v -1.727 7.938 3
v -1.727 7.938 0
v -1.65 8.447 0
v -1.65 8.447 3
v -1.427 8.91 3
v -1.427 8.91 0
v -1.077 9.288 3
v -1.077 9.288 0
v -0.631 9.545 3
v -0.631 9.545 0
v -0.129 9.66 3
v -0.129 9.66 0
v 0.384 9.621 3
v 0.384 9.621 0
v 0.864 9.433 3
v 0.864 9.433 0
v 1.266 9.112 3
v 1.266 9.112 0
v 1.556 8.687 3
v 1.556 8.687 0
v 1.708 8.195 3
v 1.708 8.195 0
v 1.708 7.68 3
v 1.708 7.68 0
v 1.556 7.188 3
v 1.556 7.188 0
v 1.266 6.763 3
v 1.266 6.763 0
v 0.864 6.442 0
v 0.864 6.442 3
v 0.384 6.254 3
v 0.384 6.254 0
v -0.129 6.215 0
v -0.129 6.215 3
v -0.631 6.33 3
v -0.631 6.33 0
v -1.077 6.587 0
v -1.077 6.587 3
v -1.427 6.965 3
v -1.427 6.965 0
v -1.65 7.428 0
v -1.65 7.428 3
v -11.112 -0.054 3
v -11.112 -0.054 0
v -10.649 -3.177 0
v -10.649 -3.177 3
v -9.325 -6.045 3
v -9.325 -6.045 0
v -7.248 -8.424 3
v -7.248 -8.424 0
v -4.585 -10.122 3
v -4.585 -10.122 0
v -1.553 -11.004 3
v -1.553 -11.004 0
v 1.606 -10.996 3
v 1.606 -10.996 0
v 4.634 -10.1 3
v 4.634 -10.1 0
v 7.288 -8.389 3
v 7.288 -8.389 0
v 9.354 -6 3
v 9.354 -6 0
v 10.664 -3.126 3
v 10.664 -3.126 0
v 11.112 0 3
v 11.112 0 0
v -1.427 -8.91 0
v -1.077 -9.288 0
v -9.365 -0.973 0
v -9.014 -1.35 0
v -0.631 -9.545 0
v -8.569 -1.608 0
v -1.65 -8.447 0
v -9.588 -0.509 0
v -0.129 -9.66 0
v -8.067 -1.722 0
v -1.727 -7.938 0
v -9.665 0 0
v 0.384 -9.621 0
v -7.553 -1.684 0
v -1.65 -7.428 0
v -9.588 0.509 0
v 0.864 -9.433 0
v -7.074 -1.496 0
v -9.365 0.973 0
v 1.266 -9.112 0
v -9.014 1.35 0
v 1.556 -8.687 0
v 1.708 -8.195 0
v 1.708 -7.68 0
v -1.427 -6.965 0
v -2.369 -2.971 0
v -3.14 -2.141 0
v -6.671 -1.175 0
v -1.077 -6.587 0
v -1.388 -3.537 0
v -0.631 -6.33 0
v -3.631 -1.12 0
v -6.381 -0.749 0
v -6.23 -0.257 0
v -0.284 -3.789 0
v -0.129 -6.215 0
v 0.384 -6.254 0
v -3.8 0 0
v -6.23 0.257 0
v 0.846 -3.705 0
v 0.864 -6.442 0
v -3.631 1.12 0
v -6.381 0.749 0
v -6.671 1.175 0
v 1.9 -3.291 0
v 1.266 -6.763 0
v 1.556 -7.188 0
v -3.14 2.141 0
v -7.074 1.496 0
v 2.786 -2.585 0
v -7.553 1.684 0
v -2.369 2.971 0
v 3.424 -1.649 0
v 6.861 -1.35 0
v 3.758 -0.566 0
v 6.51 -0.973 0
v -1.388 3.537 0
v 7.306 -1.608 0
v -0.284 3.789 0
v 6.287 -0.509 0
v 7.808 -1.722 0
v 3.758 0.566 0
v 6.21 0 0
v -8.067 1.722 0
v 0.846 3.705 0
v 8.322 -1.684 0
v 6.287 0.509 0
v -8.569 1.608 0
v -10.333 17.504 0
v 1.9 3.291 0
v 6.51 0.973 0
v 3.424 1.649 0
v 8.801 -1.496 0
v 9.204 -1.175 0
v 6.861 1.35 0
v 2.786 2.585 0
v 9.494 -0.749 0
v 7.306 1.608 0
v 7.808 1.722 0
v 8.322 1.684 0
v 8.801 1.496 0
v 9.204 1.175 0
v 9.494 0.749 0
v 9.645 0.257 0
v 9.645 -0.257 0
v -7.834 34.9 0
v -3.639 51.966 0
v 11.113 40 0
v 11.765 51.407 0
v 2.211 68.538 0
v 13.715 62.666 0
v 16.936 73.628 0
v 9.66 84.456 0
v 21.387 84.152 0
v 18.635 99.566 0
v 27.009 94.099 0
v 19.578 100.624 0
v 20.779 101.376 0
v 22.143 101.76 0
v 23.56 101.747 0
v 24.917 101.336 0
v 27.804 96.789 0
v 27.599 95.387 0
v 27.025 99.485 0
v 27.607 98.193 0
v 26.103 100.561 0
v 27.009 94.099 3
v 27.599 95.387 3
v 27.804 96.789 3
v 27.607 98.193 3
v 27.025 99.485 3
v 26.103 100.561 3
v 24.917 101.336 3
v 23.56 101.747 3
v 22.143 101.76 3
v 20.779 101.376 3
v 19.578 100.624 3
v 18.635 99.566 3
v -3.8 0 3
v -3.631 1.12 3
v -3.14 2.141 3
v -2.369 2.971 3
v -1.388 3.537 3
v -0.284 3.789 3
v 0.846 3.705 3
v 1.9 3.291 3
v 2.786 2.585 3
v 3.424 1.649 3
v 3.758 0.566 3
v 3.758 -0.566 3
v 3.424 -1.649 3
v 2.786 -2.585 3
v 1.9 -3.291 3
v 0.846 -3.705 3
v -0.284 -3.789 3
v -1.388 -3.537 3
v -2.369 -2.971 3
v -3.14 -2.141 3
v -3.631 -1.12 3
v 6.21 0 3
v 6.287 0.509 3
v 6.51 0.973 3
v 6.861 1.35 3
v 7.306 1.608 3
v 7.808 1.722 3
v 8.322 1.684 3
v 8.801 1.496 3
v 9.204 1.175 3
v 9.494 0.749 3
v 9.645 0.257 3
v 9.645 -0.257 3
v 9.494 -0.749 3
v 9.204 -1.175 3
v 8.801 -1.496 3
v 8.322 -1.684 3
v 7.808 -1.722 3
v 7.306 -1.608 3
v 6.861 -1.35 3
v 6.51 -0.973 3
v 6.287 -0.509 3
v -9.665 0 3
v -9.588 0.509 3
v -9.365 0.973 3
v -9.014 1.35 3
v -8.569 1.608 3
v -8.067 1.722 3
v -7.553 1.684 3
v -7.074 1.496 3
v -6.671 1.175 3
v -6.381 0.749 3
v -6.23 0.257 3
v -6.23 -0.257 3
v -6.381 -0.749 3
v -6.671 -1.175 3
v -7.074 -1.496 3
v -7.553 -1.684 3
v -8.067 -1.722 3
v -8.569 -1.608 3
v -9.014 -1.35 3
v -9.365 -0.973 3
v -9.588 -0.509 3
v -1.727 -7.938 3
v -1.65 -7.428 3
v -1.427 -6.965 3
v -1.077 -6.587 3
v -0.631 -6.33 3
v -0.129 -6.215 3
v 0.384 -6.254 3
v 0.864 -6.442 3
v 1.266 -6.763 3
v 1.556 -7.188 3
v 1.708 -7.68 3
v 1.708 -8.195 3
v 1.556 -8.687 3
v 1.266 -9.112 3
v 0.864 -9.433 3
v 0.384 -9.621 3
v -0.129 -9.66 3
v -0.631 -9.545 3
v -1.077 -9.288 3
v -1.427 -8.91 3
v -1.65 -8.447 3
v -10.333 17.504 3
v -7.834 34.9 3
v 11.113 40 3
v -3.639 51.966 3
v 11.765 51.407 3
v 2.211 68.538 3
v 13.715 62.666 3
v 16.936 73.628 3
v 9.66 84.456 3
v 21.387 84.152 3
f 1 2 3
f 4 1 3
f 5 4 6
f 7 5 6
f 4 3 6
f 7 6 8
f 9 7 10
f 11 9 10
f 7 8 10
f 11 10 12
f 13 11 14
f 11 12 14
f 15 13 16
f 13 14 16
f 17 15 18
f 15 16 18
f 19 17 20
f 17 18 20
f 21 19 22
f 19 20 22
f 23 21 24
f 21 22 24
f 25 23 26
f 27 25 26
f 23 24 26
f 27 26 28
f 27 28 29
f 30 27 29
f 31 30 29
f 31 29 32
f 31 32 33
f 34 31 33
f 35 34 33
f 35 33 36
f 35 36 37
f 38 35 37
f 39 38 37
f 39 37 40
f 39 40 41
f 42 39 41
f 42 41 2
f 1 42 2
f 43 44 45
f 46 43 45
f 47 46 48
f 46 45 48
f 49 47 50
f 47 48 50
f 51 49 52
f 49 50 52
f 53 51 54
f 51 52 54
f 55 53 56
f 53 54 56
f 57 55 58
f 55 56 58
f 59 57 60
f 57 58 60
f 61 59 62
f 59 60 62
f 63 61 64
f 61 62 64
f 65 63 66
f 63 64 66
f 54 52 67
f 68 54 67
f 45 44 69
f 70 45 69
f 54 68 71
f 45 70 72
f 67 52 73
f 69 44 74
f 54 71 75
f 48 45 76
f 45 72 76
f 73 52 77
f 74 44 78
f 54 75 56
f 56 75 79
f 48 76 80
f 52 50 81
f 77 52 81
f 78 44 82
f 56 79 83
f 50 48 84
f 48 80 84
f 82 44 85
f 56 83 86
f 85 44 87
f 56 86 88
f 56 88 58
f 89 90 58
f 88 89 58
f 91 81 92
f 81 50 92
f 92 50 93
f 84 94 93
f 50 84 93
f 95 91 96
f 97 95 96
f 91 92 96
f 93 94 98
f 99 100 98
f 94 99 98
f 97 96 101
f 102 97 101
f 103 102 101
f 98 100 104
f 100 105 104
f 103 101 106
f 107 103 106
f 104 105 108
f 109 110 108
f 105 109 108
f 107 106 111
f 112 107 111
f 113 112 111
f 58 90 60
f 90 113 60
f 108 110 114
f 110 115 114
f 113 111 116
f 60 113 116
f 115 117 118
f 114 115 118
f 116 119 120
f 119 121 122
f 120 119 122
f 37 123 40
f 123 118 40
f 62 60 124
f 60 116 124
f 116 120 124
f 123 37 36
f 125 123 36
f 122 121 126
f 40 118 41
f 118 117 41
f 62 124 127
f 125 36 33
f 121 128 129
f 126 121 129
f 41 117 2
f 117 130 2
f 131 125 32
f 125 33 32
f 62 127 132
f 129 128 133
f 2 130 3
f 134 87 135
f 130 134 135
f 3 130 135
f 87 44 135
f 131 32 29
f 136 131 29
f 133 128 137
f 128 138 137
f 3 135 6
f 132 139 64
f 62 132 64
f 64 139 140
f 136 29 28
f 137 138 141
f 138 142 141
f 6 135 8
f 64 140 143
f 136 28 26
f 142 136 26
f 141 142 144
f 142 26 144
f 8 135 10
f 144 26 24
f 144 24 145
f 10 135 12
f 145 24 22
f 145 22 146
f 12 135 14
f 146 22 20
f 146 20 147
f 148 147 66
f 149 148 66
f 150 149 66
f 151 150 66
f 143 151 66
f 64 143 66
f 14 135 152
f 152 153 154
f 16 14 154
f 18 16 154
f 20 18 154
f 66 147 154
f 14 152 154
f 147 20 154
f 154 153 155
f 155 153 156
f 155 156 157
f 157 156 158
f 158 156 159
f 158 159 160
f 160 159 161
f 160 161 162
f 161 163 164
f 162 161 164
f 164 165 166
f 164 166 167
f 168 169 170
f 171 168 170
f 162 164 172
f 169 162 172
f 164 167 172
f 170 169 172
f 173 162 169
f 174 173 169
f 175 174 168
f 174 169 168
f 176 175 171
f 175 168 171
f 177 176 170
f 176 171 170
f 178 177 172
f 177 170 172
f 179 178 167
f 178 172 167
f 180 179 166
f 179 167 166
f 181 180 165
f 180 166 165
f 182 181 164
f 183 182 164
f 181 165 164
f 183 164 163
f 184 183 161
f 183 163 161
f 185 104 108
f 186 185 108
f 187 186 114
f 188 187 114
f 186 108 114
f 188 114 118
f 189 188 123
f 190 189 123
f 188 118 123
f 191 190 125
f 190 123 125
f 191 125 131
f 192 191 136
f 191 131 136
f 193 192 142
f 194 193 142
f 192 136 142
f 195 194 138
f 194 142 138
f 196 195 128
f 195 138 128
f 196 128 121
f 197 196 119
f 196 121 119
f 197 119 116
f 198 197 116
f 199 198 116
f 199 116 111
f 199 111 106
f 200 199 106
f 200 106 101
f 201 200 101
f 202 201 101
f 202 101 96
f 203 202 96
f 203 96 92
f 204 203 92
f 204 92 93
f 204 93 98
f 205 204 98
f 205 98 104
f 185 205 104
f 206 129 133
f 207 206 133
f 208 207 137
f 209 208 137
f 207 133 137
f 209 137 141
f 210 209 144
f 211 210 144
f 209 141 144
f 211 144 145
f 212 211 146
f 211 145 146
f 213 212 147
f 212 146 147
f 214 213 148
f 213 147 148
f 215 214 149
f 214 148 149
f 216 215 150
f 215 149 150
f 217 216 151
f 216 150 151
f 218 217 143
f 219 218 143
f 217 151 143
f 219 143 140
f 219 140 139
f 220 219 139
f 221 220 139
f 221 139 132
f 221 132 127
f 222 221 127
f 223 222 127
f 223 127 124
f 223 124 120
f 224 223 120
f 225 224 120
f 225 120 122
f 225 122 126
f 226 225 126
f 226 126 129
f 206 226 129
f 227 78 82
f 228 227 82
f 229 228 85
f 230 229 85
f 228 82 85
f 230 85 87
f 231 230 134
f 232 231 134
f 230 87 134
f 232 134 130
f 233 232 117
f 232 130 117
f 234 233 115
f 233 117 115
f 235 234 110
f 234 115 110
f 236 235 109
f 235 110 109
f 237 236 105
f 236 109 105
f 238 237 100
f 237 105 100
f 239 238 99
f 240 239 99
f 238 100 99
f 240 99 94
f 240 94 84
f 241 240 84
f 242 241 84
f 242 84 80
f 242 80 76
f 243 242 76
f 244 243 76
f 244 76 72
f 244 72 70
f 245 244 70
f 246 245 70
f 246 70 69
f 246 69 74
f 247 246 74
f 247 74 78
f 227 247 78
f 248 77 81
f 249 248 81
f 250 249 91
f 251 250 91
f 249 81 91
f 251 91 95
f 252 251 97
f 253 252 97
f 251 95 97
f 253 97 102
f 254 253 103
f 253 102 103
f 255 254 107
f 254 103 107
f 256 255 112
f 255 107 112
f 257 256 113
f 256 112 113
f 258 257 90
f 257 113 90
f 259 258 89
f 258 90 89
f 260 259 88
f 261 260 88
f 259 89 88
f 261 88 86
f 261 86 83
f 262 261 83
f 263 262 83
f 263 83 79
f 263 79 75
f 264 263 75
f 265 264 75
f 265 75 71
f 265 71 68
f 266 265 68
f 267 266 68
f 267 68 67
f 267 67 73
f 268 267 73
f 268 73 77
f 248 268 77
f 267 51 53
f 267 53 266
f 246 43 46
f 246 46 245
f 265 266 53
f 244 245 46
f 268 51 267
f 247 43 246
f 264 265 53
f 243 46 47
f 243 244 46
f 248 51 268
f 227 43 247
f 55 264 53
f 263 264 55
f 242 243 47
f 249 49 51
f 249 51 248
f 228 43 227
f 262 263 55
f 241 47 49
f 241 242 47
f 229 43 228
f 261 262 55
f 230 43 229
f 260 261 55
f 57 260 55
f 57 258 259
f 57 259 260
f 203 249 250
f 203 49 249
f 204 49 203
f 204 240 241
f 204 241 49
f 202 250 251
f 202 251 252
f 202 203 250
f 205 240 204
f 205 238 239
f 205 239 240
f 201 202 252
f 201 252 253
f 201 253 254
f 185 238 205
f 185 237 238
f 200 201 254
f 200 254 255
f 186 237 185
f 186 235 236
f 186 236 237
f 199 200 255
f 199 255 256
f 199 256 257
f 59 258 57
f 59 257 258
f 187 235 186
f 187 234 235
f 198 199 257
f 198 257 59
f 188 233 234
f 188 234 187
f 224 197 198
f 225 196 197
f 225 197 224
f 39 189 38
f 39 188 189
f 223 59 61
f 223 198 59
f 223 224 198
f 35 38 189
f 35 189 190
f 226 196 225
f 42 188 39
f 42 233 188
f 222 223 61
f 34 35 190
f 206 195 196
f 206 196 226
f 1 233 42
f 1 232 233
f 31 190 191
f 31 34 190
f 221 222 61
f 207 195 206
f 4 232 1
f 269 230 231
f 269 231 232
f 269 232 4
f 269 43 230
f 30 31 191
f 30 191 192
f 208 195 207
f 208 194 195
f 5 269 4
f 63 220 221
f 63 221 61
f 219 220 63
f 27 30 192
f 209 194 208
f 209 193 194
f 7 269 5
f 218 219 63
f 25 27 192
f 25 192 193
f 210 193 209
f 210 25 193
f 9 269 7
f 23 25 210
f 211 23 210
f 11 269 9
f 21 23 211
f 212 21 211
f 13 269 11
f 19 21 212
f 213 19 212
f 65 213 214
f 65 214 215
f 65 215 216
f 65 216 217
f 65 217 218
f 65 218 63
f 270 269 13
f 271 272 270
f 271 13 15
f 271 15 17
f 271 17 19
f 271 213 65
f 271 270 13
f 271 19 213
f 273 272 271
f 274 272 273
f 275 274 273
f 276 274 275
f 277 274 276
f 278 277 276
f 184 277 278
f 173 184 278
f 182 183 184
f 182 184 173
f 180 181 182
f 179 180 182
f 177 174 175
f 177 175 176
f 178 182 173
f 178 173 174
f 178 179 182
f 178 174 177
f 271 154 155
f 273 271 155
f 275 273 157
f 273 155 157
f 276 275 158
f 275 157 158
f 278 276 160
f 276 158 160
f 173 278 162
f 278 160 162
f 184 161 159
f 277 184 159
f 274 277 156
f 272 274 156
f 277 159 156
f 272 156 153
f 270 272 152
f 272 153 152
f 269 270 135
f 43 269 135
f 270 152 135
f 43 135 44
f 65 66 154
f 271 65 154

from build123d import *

# Parameters (mm, degrees)
BOSS_EXTRU_3_DEPTH   = 3
D_GAGEMENT_51_D      = 3.4544
D_GAGEMENT_M71_D     = 7.6
D_GAGEMENT_M71_DEPTH = 7.01
D_GAGEMENT_M71_TIP   = 2.283270352


with BuildPart() as part:
    # Esquisse1 → Boss.-Extru.3 (new body)
    with BuildSketch(Plane.XY):
        with BuildLine():
            Line((11.1125, 0), (11.1125, 40))
            ThreePointArc((11.1125, 40), (15.168988239, 68.192952149), (27.009351017, 94.098616722))
            ThreePointArc((27.009351017, 94.098616722), (25.537478416, 100.990911223), (18.635346271, 99.565883395))
            ThreePointArc((18.635346271, 99.565883395), (-3.639418742, 51.966145876), (-11.112370677, -0.053611501))
            ThreePointArc((-11.112370677, -0.053611501), (0.026805829, -11.112467669), (11.1125, 0))
        make_face()
    extrude(amount=BOSS_EXTRU_3_DEPTH)

    # Dégagement #51 (through all)
    with Locations(Plane.XY.offset(3)):
        with Locations((-7.9375, 0), (0, 7.9375), (7.9375, 0), (0, -7.9375)):
            Hole(D_GAGEMENT_51_D / 2)

    # Dégagement M71
    with Locations(Plane.XY.offset(3)):
        with Locations((0, 0)):
            Hole(D_GAGEMENT_M71_D / 2, depth=D_GAGEMENT_M71_DEPTH)
            with Locations((0, 0, -(D_GAGEMENT_M71_DEPTH + D_GAGEMENT_M71_TIP / 2))):  # 118° drill point
                Cone(0, D_GAGEMENT_M71_D / 2, D_GAGEMENT_M71_TIP, mode=Mode.SUBTRACT)


solid = part.part
